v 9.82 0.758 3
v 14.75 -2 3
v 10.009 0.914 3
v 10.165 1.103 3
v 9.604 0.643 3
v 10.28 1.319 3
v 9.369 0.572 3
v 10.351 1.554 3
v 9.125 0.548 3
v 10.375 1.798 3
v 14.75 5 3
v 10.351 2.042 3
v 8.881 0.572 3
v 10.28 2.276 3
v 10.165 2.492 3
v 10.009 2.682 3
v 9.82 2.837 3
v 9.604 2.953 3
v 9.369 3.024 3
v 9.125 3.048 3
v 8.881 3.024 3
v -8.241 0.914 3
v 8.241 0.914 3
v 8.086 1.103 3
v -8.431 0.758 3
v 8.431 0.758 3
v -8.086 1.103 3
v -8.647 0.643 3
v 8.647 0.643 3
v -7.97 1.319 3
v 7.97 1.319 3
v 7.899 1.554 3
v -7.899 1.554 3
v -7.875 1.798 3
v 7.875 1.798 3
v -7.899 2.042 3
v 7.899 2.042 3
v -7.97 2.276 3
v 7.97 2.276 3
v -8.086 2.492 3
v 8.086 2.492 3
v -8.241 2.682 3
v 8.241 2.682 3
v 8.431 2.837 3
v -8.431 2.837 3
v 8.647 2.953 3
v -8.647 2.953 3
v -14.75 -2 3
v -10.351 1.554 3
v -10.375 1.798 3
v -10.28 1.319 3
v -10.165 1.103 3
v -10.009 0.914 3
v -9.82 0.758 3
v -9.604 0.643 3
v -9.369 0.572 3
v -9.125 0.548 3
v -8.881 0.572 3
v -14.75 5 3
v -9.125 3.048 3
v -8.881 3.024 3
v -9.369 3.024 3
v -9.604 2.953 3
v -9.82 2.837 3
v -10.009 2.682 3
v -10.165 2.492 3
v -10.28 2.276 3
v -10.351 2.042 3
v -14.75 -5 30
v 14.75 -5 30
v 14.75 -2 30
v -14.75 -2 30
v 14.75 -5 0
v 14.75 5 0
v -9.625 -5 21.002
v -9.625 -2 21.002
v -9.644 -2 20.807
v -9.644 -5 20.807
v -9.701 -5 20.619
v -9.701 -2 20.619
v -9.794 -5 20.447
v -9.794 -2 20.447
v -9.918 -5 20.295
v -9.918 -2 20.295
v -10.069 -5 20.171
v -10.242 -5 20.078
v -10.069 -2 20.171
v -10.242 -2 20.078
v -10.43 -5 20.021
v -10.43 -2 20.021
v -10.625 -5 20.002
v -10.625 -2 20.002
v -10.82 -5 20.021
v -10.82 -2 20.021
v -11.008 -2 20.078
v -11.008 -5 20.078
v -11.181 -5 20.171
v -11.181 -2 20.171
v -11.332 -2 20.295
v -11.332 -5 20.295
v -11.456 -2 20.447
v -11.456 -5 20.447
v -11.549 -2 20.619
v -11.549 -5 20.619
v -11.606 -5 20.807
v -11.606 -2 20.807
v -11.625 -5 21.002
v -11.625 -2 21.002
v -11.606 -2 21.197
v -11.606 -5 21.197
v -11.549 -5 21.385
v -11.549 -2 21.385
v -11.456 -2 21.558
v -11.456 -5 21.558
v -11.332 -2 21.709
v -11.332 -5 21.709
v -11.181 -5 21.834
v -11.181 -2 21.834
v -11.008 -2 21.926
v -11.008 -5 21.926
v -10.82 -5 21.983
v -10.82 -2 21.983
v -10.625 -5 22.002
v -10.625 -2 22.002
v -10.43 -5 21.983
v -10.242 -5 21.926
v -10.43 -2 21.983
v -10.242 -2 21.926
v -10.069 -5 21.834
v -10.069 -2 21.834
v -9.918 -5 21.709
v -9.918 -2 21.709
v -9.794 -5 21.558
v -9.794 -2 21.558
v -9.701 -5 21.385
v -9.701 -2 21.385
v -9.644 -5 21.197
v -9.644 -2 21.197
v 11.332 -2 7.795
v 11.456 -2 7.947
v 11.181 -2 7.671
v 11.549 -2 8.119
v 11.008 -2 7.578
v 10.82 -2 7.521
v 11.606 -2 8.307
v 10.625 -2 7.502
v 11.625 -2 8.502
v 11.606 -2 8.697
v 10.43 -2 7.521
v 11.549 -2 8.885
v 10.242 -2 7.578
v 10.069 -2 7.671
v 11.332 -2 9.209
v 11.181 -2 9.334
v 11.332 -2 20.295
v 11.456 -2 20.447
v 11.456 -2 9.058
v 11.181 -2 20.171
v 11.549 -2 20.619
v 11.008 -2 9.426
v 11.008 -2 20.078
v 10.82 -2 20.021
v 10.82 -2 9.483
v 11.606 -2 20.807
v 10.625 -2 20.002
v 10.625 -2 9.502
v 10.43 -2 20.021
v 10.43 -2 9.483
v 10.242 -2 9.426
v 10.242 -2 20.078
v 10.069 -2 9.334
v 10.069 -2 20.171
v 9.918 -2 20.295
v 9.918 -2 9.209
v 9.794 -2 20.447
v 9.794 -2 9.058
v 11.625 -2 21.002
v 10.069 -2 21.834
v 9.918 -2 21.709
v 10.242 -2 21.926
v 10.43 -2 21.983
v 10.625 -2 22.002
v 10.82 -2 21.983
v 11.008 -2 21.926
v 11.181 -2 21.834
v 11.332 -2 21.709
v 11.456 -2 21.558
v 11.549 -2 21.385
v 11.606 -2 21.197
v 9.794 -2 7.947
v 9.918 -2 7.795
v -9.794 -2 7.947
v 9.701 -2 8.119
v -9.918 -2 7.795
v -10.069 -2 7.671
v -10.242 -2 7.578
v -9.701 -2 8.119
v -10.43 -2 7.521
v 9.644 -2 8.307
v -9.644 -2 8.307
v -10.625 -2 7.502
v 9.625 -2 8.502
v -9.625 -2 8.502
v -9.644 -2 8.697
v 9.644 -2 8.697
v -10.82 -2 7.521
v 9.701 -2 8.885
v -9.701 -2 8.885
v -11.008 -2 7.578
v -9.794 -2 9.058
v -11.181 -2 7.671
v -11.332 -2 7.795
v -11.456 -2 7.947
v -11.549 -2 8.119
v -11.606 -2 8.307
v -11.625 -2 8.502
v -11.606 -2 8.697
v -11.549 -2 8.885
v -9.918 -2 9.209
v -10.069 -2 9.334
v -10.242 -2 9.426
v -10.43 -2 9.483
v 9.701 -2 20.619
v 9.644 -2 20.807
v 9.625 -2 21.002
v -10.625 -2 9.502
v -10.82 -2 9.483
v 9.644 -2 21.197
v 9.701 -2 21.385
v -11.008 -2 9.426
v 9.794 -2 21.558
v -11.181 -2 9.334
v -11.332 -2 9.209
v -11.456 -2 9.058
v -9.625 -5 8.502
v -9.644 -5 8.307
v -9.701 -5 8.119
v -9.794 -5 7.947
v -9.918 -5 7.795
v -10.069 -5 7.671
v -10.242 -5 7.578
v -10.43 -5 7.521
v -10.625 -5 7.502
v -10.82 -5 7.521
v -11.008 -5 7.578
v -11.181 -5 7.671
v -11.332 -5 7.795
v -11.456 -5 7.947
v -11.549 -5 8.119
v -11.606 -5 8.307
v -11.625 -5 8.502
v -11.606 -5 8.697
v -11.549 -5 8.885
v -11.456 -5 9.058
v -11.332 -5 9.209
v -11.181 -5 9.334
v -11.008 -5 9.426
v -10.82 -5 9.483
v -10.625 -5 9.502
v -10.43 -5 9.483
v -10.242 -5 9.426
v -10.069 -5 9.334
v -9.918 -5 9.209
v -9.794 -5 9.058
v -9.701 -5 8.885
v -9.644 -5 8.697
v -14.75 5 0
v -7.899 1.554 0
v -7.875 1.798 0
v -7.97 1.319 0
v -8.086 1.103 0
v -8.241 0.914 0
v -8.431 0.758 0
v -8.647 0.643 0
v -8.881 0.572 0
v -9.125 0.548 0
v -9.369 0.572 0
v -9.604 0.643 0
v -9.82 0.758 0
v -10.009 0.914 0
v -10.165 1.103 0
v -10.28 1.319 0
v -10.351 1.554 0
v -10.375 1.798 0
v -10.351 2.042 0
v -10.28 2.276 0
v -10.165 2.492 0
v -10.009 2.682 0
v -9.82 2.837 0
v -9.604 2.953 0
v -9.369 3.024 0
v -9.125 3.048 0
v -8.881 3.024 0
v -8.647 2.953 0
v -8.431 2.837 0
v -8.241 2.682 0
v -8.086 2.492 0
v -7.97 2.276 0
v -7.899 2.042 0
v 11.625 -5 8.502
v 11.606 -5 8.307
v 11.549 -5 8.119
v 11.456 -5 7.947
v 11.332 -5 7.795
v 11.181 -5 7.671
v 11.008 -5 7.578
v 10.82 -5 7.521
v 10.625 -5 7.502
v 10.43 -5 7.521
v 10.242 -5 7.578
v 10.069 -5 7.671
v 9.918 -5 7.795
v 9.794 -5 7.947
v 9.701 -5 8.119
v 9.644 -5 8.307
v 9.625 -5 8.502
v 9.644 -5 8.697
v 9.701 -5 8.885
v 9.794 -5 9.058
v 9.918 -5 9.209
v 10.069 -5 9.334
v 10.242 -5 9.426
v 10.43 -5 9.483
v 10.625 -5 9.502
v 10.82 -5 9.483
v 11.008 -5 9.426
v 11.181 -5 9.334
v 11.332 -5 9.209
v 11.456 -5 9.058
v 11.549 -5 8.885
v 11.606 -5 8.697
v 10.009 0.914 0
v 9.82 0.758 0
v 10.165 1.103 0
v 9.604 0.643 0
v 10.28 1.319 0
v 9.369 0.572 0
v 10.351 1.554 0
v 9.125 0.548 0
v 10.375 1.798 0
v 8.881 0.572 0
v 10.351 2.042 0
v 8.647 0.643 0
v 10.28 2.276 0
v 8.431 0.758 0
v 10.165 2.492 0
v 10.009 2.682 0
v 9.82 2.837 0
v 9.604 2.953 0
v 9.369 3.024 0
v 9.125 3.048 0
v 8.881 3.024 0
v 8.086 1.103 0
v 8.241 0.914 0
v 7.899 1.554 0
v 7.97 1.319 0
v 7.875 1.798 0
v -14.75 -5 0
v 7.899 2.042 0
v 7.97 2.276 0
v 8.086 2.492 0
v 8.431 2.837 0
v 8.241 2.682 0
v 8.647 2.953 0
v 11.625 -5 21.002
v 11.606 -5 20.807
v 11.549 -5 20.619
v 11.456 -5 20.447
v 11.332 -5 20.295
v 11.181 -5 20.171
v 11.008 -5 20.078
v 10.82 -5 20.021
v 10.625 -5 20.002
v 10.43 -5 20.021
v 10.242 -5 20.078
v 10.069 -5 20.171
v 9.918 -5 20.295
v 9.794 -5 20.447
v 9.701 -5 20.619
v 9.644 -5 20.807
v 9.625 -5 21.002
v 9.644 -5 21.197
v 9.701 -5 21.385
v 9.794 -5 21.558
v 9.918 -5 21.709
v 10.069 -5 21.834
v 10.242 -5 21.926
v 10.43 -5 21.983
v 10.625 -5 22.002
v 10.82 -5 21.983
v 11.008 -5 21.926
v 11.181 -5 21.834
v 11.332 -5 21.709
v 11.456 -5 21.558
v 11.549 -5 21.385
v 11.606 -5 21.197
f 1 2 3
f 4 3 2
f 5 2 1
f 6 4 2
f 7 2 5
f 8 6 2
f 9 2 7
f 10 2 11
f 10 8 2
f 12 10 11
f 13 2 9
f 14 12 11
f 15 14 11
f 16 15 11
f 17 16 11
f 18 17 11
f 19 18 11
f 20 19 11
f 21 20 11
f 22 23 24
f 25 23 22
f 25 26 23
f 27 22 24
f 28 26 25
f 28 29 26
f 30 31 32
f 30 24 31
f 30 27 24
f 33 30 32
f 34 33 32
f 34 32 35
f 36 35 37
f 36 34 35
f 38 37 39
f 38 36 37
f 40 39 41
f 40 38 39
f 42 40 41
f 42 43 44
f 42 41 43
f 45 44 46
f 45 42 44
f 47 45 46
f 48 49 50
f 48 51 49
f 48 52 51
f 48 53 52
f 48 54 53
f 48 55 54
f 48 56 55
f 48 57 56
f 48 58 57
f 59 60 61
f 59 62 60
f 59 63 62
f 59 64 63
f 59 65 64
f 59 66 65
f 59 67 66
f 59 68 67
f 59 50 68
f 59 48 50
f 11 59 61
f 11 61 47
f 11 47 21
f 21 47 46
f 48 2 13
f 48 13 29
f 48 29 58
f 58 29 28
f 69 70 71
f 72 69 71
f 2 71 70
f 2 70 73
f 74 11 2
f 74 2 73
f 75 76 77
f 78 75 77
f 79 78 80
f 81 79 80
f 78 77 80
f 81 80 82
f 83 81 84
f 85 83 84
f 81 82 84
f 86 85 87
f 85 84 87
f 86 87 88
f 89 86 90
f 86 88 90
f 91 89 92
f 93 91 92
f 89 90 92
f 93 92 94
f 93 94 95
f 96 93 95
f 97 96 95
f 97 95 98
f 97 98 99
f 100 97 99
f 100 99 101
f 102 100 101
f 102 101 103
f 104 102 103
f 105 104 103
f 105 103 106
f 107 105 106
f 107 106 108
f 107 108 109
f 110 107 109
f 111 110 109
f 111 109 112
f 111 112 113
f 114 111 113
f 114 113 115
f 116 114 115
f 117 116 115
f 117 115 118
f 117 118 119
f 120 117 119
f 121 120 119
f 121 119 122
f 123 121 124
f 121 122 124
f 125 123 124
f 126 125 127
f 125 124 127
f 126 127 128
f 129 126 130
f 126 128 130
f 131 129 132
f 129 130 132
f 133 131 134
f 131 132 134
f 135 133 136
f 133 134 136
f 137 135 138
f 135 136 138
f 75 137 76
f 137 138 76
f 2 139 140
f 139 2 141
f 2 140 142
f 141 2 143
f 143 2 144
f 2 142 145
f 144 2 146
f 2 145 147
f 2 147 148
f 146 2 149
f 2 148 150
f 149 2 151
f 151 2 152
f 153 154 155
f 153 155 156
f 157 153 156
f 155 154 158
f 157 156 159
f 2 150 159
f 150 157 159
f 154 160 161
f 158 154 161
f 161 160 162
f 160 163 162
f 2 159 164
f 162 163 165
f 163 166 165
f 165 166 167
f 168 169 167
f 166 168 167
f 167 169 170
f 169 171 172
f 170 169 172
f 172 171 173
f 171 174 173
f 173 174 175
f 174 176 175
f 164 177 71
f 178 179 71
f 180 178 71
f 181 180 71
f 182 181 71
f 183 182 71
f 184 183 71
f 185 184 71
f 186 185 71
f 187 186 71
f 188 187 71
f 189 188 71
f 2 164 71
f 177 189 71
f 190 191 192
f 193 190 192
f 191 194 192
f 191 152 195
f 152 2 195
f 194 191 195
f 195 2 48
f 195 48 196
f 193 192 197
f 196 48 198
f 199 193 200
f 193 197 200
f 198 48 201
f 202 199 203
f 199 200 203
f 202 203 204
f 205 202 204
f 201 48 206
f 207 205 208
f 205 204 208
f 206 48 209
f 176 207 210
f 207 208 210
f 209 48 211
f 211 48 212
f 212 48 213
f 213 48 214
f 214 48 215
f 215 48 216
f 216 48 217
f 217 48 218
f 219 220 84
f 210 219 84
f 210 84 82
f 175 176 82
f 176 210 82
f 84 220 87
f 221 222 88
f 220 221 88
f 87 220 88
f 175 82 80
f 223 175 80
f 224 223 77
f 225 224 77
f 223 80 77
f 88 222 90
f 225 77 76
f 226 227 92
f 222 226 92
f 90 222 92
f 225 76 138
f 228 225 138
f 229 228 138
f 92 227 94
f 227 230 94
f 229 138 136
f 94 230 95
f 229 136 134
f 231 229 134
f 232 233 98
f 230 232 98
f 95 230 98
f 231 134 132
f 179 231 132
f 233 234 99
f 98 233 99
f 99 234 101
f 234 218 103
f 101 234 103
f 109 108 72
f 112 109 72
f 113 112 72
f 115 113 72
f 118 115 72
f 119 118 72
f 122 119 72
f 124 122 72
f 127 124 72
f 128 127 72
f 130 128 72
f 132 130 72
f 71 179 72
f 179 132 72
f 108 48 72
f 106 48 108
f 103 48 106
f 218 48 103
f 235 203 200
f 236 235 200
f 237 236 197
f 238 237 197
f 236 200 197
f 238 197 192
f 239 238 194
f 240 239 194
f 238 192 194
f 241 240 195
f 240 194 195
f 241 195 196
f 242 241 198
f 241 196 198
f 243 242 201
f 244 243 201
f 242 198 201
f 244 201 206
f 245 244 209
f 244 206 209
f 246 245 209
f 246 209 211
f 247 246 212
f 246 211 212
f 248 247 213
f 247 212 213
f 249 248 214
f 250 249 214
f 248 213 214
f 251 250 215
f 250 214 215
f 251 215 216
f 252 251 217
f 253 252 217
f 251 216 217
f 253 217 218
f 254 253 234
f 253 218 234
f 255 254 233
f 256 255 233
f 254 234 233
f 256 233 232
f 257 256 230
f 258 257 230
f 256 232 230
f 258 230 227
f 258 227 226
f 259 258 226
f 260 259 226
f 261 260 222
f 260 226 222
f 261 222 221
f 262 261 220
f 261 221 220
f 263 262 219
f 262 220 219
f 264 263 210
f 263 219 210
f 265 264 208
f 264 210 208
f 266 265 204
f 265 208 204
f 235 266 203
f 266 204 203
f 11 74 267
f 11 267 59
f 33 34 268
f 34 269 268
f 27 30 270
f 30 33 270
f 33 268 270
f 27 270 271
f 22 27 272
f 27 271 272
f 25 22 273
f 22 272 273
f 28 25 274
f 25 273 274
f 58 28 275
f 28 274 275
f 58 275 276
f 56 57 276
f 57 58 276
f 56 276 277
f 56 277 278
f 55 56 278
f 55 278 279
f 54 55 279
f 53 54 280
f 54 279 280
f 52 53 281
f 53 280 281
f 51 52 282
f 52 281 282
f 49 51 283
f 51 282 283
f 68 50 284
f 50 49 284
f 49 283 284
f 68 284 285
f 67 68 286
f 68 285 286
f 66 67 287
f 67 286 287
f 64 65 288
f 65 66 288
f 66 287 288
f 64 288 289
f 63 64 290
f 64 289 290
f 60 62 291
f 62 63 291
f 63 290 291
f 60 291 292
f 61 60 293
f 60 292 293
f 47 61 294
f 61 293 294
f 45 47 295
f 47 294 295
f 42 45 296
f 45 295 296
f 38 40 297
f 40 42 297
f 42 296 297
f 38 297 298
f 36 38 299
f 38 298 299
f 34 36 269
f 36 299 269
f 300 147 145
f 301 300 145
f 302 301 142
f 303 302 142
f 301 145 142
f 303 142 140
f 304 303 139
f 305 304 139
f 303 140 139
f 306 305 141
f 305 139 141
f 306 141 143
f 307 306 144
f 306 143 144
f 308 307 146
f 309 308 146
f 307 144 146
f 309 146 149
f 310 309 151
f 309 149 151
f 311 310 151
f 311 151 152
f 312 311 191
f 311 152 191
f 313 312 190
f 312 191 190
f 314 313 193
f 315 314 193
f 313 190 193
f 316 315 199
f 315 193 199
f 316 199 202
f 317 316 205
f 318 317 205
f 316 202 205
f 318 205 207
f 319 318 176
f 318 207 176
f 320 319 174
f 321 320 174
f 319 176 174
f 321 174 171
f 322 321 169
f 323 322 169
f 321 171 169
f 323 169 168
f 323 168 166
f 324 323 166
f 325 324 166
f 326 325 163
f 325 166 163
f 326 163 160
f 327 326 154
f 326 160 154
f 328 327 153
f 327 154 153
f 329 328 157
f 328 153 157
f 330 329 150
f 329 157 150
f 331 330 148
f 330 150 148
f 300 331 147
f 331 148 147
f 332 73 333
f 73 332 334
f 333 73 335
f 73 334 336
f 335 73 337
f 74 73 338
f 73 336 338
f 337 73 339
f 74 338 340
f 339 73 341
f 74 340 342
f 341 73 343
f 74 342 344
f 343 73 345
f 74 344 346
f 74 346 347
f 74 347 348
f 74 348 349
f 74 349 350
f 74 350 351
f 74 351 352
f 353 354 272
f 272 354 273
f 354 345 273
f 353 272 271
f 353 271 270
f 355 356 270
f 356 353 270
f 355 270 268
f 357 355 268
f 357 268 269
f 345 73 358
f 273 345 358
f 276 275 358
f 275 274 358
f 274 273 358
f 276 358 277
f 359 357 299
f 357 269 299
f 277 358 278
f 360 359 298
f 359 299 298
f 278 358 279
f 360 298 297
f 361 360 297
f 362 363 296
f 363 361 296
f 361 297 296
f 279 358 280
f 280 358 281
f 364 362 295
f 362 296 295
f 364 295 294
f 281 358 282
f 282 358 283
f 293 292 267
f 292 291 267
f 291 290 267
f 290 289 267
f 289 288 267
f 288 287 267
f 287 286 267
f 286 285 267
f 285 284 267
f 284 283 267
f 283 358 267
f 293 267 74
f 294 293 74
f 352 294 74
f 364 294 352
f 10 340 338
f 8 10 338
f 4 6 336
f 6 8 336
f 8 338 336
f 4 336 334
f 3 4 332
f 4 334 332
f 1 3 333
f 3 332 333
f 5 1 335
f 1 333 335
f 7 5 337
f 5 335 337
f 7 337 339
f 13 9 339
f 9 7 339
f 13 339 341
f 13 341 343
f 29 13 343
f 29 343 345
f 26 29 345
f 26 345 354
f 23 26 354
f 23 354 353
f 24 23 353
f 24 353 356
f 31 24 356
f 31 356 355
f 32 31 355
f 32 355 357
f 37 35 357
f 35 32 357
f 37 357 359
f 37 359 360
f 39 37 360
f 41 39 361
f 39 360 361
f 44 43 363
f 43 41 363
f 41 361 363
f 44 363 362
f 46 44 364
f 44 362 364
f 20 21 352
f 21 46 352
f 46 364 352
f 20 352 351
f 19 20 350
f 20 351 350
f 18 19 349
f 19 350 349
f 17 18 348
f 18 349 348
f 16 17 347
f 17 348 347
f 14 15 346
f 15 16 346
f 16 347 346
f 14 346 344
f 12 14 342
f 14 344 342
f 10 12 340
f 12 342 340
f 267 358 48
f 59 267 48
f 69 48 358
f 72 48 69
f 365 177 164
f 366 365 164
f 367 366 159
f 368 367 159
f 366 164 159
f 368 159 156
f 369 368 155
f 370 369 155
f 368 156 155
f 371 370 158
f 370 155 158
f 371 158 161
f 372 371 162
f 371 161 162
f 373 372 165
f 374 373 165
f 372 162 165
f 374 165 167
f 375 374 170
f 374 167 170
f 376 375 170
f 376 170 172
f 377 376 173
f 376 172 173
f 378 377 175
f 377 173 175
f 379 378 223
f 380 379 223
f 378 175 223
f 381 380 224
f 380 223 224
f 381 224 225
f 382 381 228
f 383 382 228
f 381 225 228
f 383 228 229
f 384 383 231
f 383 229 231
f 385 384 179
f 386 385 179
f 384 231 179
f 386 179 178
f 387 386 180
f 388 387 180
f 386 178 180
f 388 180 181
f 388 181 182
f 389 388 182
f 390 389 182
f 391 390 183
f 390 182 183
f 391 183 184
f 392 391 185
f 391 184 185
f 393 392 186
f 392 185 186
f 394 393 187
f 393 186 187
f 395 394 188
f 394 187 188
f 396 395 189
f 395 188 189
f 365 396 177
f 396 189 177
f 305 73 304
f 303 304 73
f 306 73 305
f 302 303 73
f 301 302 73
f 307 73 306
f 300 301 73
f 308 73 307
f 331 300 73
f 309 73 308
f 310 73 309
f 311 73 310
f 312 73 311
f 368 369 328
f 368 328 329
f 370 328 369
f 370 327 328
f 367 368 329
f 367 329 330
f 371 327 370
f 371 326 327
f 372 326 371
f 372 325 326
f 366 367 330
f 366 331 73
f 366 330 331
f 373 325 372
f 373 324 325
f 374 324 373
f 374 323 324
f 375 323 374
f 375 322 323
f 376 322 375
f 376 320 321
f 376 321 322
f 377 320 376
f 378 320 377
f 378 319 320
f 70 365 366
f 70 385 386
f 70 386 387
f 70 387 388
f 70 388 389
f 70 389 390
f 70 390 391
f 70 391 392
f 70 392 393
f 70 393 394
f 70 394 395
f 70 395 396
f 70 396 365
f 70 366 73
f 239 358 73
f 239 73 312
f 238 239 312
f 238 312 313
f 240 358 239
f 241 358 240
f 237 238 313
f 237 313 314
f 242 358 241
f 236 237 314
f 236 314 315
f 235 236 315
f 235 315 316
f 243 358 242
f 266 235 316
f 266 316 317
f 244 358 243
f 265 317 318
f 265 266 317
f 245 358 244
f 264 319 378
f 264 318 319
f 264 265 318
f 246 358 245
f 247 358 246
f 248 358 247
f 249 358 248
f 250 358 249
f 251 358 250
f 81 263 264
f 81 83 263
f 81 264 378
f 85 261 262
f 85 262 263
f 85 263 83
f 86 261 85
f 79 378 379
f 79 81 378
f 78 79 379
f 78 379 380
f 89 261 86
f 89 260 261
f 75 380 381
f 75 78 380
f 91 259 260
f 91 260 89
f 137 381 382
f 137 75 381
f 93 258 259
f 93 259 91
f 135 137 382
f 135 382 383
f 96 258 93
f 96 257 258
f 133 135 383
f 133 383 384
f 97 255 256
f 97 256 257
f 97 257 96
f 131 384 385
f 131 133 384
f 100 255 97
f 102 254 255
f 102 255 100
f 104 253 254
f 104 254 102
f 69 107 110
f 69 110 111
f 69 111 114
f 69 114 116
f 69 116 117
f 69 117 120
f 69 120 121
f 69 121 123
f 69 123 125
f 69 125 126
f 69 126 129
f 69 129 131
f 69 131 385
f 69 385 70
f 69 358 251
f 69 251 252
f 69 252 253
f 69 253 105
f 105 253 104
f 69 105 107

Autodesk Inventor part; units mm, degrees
ref_plane "YZ Plane" through (0, 0, 0) normal (1, 0, 0) x (0, 1, 0)
ref_plane "XZ Plane" through (0, 0, 0) normal (0, 1, 0) x (-1, 0, 0)
ref_plane "XY Plane" through (0, 0, 0) normal (0, 0, 1) x (1, 0, 0)
sketch "Sketch1" plane through (0, 0, 0) normal (0, 0, 1) x (1, 0, 0)
  line L0 (-12, -5) -> (12, -5)
  line L1 (12, -5) -> (12, 5)
  line L2 (12, 5) -> (-12, 5)
  line L3 (-12, 5) -> (-12, -5)
  line L4 (-12, -5) -> (12, 5) construction
  line L5 (12, -5) -> (-12, 5) construction
  line L6 (-12, 5) -> (-10, 5)
  line L7 (-12, 3) -> (-12, 5)
  line L8 (12, 5) -> (10, 5)
  line L9 (12, 3) -> (12, 5)
  circle A0 centre (-9.1253, 1.7977) radius 1.25
  circle A1 centre (9.1253, 1.7977) radius 1.25
  point P0 (0, 0)
  point P1 (-12, 0)
  point P2 (12, 0)
  point P3 (10.3753, 1.7977)
  point P4 (10.375, 1.7725)
  point P5 (9.4672, 3)
  point P6 (-9.4672, 3)
  point P7 (10.375, 1.7725)
  point P8 (-10.375, 1.7725)
  dimension "d0" = 24
  dimension "d1" = 10
  dimension "d14" = 2.5
  dimension "d15" = 2.5
  dimension "d55" = 8
  dimension "d58" = 8
  dimension "d60" = 1.625
  dimension "d61" = 1.625
  dimension "d62" = 18.2505
extrude "Extrusion4" add sketch "Sketch1" along normal blind 3
sketch "Sketch3" plane through (0, 0, 3) normal (0, 0, 1) x (1, 0, 0)
  line L0 (12, -5) -> (12, 5) projected
  line L1 (12, -5) -> (-12, -5)
  line L2 (-12, -5) -> (-12, -2)
  line L3 (-12, -2) -> (12, -2)
  line L4 (12, -2) -> (12, -5)
  point P0 (0, 0)
  point P1 (-12, -5)
  point P2 (12, 3)
  dimension "d24" = 3
extrude "Extrusion5" add sketch "Sketch3" along normal blind 27
sketch "Sketch4" plane through (-12, -2, 3) normal (0, 1, 0) x (1, 0, 0)
  circle A0 centre (22.625, -18.0021) radius 1
  circle A1 centre (1.375, -18.0021) radius 1
  circle A2 centre (22.625, -5.5021) radius 1
  circle A3 centre (1.375, -5.5021) radius 1
  line L0 (24, -0.0021) -> (0, -0.0021)
  line L1 (24, 0) -> (24, -27) projected
  line L2 (0, 3) -> (0, -27) projected
  point P0 (12, 3)
  dimension "d68" = 1.375
  dimension "d69" = 1.375
  dimension "d70" = 1.375
  dimension "d71" = 1.375
extrude "Extrusion7" cut sketch "Sketch4" against normal blind 3
sketch "Sketch5" plane through (0, 0, 0) normal (0, 0, -1) x (-1, 0, 0)
  circle A0 centre (-9.1253, 1.7977) radius 1.25 projected
  circle A1 centre (9.1253, 1.7977) radius 1.25 projected
  point P0 (0, 0)
sketch "Sketch6" plane through (-12, -5, 0) normal (-1, 0, 0) x (0, 0, 1)
  line L0 (0, 10) -> (0, 0) projected
  line L1 (0, 10) -> (3, 10) projected
  line L2 (0, 10) -> (3, 10)
  line L3 (3, 3) -> (3, 10) projected
  line L4 (3, 10) -> (3, 3)
  line L5 (30, 3) -> (30, 0) projected
  line L6 (3, 3) -> (30, 3)
  line L7 (30, 3) -> (30, 0)
  line L8 (30, 0) -> (0, 0)
  line L9 (0, 0) -> (0, 10)
  point P0 (0, 5)
extrude "Extrusion8" add sketch "Sketch6" along normal blind 2.75
sketch "Sketch7" plane through (12, -5, 0) normal (1, 0, 0) x (0, 0, -1)
  line L0 (0, 0) -> (0, 10) projected
  line L1 (0, 10) -> (-3, 10) projected
  line L2 (0, 10) -> (-3, 10)
  line L3 (-3, 3) -> (-3, 10) projected
  line L4 (-3, 10) -> (-3, 3)
  line L5 (-30, 0) -> (-30, 3) projected
  line L6 (-3, 3) -> (-30, 3)
  line L7 (-30, 3) -> (-30, 0)
  line L8 (0, 0) -> (-30, 0) projected
  line L9 (-30, 0) -> (0, 0)
  line L10 (0, 0) -> (0, 10)
  point P0 (0, 5)
extrude "Extrusion9" add sketch "Sketch7" along normal blind 2.75
properties part number "Kamera Holder"
